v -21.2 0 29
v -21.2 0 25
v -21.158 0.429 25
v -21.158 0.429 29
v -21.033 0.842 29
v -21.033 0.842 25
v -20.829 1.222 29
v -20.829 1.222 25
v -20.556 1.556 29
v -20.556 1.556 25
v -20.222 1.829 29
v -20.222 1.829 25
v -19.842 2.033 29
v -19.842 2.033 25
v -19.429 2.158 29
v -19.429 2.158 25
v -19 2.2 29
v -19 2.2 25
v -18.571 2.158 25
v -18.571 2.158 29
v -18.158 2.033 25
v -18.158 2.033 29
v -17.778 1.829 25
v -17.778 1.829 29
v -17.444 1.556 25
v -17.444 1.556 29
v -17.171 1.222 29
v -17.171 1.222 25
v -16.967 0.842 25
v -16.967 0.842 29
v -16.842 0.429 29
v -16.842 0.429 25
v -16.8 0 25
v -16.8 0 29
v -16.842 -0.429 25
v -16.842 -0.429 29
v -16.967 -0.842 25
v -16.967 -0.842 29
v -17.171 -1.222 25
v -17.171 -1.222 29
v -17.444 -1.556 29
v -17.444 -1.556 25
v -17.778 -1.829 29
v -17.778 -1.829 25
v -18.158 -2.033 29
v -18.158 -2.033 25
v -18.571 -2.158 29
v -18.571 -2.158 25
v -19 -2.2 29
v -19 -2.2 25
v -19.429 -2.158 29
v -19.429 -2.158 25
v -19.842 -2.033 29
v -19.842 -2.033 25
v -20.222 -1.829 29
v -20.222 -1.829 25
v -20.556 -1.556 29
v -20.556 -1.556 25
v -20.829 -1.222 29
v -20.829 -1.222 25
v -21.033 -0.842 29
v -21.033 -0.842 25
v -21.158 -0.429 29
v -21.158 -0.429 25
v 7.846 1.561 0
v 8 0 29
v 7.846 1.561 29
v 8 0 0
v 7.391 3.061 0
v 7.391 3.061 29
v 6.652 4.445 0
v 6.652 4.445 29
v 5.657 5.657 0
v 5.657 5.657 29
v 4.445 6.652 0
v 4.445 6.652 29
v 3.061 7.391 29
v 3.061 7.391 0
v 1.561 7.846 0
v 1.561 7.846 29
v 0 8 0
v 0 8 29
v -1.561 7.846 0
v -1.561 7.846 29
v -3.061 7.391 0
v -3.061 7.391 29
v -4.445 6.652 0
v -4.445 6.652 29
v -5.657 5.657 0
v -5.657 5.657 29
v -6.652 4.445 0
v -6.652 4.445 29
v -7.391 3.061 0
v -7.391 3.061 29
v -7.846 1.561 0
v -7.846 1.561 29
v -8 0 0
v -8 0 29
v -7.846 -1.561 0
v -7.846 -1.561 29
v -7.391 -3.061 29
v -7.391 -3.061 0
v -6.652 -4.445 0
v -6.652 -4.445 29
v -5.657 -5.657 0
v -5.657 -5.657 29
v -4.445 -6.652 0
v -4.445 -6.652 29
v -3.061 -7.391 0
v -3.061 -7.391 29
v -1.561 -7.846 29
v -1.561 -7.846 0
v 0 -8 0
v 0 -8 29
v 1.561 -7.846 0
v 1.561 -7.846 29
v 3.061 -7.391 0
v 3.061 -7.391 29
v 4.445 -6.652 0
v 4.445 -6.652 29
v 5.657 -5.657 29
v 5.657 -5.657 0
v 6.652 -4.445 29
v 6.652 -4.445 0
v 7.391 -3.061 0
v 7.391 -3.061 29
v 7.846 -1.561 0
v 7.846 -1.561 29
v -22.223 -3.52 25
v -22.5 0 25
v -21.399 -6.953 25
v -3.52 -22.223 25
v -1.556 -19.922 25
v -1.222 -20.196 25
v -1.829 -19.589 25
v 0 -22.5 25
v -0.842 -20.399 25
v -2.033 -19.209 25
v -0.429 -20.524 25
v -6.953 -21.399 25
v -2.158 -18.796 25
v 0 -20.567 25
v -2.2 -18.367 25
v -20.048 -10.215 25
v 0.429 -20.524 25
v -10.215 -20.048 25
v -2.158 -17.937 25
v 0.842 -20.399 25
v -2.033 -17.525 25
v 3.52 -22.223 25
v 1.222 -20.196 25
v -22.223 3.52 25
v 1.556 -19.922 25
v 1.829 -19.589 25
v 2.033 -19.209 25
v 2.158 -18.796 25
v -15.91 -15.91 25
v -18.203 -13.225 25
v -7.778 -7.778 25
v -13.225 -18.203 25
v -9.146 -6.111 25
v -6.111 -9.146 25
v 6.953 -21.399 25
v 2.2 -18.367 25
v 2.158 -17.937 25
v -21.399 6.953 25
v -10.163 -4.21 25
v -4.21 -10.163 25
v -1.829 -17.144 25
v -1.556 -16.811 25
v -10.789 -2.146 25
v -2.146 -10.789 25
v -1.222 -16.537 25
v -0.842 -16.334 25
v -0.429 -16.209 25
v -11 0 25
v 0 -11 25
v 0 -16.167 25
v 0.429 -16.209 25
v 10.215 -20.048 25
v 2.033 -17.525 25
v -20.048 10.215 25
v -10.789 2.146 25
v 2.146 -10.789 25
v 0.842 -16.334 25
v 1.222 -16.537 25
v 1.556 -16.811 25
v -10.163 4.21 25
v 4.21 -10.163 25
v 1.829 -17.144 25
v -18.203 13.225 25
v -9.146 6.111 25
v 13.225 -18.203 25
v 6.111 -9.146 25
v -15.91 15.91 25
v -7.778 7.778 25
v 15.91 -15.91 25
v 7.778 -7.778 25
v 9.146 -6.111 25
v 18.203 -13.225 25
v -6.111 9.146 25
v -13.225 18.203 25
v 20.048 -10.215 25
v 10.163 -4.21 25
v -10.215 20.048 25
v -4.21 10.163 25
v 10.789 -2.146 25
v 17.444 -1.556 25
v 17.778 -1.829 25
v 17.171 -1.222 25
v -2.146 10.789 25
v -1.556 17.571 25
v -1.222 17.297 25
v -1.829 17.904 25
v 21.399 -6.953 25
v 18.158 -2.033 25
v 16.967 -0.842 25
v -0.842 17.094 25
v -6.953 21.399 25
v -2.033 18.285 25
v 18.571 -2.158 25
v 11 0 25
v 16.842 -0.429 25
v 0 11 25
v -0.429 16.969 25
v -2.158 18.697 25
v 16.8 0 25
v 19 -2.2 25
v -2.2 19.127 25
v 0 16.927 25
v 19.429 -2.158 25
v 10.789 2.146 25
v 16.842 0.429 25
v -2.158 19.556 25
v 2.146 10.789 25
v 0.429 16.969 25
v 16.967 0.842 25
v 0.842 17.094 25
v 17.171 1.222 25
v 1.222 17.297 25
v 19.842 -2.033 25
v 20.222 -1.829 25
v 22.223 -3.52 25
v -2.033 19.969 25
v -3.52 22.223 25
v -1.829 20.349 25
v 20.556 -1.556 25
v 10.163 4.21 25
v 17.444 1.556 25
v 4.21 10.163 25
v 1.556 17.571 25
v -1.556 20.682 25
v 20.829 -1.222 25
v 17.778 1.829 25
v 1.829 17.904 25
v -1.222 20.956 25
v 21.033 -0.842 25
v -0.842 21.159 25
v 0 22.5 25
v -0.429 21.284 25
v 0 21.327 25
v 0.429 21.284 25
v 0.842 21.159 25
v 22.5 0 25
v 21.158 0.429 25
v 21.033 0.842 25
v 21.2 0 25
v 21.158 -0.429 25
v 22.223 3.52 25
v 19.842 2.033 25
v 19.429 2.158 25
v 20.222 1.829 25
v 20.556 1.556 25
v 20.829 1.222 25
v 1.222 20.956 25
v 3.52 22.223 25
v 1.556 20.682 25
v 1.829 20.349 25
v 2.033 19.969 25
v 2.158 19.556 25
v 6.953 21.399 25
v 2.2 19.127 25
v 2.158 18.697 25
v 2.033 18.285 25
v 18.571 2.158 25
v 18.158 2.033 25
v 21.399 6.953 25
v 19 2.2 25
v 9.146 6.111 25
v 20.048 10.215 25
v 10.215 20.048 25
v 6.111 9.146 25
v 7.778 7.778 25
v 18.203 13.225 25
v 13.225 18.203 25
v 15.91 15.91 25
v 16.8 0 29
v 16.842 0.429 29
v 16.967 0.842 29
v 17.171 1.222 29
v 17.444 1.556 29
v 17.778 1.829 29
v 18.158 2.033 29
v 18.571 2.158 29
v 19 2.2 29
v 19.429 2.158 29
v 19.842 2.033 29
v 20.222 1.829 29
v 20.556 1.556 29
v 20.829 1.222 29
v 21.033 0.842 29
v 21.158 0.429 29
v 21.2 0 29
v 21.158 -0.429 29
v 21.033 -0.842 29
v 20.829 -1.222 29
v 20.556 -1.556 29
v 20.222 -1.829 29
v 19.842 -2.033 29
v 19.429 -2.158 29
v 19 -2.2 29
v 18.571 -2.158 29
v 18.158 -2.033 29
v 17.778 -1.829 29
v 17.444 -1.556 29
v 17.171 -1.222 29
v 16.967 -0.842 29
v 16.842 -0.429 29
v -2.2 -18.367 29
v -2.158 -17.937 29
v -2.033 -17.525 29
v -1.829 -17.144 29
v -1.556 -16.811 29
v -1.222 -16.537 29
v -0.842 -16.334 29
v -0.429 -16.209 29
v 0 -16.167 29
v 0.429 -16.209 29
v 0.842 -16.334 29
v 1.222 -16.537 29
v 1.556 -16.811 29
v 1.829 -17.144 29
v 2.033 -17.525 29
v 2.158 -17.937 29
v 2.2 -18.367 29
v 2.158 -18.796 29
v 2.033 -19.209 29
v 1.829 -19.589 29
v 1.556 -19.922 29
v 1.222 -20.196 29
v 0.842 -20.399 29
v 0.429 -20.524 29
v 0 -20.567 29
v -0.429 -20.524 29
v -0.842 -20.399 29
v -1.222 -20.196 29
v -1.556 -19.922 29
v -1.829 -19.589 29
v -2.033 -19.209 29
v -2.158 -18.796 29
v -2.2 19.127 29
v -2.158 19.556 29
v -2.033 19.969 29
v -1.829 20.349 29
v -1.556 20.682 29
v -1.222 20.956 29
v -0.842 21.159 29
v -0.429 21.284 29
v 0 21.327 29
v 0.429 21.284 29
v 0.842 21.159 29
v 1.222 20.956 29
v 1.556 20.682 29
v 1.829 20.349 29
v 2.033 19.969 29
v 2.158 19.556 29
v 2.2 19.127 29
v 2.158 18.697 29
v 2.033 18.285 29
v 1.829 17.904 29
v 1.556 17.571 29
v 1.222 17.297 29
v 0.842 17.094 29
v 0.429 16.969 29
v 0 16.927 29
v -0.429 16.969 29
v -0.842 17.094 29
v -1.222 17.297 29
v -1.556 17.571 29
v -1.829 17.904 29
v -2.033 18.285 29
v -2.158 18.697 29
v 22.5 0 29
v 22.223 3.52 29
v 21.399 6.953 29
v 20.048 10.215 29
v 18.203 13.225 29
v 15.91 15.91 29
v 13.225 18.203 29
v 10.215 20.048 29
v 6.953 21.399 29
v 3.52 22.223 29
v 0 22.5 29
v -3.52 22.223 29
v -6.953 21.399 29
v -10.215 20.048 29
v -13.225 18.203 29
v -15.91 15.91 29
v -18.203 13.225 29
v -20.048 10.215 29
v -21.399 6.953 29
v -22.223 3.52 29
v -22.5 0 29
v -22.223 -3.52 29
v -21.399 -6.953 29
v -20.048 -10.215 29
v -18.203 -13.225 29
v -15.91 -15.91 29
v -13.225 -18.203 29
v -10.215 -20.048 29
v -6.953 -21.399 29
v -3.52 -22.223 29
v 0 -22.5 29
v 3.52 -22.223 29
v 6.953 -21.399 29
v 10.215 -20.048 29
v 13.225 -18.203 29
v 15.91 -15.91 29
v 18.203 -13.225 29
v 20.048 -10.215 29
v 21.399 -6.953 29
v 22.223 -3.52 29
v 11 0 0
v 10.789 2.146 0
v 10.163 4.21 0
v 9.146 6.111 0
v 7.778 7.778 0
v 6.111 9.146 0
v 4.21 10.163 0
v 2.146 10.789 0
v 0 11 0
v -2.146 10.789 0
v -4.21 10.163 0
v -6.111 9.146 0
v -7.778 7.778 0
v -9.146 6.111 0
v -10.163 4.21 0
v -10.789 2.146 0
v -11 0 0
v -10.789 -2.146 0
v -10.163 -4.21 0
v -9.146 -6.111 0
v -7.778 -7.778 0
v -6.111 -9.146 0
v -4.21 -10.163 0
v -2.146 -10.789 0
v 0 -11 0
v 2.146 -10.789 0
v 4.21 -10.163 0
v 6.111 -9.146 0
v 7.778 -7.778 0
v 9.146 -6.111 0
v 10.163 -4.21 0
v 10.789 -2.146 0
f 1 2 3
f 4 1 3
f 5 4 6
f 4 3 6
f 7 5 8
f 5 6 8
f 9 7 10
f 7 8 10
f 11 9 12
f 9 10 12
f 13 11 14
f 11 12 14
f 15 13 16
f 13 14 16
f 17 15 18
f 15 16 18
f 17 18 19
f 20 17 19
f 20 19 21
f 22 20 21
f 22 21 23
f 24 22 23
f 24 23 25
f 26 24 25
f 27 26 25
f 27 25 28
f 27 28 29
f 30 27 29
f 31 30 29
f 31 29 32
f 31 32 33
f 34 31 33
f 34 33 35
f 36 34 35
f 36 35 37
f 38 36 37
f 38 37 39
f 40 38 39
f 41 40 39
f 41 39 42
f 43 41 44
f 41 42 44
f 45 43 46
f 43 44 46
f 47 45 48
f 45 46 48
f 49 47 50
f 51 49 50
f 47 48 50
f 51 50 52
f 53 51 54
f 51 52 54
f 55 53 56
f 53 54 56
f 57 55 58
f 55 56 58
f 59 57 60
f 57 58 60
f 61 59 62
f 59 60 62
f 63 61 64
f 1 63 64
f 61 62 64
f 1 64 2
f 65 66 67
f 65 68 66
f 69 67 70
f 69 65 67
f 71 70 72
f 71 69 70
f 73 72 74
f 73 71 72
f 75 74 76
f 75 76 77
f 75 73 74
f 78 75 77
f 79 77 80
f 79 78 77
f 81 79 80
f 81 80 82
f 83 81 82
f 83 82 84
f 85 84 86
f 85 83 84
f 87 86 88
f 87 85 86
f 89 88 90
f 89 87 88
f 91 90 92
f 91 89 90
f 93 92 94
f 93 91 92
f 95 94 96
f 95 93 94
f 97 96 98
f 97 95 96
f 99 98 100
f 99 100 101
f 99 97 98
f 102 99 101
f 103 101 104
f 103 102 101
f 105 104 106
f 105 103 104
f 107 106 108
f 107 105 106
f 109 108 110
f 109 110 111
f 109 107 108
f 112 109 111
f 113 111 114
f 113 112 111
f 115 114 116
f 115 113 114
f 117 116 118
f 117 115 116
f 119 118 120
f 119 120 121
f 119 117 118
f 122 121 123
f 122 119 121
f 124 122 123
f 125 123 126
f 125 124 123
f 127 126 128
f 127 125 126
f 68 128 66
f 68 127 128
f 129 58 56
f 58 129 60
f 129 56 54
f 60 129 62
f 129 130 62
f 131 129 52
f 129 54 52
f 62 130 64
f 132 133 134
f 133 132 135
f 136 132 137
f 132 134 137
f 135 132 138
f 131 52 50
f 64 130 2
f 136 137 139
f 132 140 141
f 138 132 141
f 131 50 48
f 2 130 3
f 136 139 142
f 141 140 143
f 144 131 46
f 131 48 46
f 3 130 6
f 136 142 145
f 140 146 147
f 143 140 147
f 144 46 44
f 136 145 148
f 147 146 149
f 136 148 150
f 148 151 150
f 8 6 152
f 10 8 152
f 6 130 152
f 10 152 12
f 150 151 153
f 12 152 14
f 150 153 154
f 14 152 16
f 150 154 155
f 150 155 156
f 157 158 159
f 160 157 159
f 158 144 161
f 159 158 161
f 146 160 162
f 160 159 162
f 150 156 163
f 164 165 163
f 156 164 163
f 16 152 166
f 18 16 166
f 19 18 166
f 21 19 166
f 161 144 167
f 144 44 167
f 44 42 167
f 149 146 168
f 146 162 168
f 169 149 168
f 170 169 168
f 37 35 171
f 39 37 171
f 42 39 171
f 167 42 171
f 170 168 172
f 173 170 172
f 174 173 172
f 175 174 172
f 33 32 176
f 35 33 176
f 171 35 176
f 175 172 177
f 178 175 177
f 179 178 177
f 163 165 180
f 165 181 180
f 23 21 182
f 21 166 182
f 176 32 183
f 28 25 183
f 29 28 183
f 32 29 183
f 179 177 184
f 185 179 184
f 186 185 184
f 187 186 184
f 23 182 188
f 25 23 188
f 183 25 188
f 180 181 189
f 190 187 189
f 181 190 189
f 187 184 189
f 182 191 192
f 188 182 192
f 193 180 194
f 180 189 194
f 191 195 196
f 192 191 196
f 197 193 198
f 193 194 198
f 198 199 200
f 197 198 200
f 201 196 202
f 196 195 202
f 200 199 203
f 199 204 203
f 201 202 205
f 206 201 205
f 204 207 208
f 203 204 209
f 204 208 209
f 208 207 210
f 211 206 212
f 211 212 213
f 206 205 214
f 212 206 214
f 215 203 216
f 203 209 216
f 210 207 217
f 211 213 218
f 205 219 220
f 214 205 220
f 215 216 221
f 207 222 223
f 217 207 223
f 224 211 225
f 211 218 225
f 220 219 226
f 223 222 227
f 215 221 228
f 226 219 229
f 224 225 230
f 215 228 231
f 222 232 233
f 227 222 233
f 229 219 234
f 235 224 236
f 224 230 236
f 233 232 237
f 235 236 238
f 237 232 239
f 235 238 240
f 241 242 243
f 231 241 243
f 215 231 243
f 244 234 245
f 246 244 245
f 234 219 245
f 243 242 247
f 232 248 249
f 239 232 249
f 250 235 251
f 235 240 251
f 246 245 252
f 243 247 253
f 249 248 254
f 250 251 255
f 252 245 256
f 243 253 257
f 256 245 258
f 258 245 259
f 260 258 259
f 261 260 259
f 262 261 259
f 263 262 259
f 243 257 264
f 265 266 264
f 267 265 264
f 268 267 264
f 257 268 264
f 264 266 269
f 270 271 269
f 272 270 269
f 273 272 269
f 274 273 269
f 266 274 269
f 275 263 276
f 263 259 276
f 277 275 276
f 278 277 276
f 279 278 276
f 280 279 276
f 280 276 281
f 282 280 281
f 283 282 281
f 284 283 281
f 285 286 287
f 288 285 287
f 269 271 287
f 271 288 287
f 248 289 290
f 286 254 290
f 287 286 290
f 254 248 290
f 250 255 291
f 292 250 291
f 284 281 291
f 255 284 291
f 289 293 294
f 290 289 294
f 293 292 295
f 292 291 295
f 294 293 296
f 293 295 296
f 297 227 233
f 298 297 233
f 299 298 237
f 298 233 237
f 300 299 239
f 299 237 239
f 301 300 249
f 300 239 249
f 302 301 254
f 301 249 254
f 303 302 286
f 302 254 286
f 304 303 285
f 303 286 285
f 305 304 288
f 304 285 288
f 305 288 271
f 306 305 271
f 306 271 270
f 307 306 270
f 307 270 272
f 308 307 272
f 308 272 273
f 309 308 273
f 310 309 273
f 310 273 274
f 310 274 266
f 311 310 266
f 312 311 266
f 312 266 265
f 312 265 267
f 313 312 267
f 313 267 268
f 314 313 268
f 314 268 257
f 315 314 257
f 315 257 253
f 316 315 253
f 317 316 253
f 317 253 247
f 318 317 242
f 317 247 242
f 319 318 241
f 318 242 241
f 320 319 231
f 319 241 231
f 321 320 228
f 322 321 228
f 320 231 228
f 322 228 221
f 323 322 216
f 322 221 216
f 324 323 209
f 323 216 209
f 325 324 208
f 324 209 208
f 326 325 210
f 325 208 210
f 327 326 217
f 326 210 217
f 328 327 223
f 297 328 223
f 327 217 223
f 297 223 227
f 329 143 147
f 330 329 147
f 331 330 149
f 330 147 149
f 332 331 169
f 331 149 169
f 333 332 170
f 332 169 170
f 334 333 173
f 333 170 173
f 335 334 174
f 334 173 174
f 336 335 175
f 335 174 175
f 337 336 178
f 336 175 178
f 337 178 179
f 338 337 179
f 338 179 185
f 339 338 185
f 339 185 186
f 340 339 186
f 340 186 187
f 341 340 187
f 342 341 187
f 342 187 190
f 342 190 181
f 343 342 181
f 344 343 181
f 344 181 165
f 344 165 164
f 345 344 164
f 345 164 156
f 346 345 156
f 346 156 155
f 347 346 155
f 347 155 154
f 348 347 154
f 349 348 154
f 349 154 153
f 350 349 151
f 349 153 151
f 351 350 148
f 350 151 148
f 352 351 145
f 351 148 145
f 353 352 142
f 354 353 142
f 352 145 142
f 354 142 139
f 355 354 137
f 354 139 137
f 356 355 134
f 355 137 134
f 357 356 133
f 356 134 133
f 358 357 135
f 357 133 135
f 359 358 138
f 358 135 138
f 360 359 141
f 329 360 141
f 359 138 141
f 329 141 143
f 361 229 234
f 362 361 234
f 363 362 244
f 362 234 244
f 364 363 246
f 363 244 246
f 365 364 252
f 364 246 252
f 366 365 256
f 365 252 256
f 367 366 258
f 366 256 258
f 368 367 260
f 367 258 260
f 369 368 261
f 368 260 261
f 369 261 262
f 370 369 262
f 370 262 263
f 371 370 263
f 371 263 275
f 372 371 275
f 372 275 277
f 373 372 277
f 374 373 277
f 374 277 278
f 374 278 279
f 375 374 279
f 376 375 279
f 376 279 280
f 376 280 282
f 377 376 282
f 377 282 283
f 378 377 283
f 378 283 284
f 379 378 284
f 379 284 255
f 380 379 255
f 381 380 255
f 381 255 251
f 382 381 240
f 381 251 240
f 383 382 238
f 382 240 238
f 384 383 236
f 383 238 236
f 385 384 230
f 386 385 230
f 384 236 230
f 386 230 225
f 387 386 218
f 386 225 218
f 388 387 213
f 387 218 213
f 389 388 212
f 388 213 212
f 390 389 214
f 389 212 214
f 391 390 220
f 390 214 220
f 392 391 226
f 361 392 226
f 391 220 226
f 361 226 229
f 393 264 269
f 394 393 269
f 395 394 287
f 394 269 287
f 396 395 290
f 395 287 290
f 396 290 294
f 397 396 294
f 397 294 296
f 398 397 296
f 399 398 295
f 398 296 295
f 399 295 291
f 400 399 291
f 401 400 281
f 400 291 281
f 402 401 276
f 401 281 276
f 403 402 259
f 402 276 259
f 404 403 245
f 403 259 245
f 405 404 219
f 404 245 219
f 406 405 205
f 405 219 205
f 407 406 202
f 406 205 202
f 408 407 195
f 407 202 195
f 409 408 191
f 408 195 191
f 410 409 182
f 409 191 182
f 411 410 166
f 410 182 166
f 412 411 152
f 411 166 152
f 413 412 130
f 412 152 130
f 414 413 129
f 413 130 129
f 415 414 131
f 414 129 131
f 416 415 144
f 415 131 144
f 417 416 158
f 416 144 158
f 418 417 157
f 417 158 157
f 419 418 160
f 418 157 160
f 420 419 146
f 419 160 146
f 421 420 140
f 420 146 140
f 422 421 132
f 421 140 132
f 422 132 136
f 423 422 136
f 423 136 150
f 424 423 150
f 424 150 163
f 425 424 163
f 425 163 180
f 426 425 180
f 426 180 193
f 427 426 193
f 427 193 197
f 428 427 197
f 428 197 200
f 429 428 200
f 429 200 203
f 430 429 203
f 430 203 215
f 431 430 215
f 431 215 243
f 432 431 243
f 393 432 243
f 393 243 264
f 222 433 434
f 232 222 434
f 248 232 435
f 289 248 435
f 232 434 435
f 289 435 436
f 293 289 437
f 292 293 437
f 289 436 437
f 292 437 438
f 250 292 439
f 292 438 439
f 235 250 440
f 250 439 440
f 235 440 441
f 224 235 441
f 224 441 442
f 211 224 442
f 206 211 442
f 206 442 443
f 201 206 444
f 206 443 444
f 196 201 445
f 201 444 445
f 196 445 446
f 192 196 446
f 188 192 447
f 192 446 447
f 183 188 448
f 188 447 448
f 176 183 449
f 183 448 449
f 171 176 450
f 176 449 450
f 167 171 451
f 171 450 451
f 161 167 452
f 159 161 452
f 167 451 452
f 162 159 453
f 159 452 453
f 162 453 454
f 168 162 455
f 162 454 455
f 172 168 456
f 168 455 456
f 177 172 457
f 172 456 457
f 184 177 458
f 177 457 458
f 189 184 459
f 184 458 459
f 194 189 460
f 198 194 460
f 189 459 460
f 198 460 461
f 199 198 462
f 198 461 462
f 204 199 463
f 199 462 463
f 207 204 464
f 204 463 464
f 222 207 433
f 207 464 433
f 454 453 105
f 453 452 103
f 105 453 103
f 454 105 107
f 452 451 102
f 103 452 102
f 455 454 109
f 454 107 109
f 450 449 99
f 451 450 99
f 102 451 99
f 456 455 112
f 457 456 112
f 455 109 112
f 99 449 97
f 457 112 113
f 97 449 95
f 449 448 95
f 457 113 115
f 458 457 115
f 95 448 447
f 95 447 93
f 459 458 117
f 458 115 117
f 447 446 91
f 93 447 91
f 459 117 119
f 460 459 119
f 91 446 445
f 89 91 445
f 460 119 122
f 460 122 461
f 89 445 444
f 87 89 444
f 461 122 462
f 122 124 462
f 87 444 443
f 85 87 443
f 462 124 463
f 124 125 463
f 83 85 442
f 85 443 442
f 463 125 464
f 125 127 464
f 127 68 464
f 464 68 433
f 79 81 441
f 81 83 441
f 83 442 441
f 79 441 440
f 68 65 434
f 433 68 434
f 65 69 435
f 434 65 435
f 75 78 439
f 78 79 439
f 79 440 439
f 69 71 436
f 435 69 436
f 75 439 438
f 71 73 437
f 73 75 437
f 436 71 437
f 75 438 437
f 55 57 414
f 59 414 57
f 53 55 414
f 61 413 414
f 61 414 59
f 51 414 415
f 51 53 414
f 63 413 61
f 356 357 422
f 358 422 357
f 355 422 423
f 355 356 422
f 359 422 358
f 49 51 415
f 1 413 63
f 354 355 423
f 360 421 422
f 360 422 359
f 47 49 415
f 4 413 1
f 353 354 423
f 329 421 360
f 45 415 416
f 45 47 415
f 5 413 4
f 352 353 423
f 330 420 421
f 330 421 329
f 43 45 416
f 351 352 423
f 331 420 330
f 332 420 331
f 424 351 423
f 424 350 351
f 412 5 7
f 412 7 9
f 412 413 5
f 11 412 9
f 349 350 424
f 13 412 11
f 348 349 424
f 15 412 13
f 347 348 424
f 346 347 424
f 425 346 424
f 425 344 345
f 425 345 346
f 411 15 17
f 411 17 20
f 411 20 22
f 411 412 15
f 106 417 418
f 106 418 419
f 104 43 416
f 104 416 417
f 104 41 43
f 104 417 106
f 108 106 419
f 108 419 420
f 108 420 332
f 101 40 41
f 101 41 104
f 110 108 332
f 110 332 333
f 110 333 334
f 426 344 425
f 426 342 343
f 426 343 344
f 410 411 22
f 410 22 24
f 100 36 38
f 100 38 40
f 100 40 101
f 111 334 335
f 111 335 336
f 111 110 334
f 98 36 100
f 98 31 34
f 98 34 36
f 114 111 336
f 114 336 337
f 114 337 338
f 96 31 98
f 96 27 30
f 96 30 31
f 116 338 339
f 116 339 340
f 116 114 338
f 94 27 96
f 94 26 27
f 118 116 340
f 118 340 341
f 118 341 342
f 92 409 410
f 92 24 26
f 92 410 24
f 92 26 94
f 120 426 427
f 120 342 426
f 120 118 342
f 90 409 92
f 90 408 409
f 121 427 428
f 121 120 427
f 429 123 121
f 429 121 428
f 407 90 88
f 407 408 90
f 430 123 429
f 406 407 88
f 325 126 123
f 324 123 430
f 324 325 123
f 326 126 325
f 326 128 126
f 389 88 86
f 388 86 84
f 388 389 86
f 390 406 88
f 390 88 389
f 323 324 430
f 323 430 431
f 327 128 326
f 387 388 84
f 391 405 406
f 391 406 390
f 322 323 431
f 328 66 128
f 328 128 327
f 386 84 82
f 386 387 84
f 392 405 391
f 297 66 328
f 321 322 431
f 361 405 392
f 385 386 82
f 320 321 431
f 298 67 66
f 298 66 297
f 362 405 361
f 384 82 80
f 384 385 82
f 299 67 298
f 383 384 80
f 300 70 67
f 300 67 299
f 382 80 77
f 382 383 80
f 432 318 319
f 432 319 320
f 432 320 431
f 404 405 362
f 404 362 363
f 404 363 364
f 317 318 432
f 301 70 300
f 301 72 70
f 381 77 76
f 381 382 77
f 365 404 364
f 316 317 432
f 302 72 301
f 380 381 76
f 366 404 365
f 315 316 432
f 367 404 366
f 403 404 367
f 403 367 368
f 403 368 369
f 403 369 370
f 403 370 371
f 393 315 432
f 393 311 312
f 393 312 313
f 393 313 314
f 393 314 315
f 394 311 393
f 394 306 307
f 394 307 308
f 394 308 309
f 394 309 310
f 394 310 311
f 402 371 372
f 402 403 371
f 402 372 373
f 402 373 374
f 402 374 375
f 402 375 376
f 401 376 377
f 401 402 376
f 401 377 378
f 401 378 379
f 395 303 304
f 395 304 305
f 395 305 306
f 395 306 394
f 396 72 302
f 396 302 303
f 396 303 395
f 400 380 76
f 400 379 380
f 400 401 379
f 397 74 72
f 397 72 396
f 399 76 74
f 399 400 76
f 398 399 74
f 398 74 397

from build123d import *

# Parameters (mm, degrees)
F0_R     = 11
F0_R_2   = 8
F1_DEPTH = 25
F2_R     = 22.5
F2_R_2   = 11
F2_R_3   = 8
F3_DEPTH = 4
F5_D     = 4.4


with BuildPart() as f1:
    # F0 (on Top) → F1 (new body)
    with BuildSketch(Plane.XY):
        Circle(F0_R)
        Circle(F0_R_2, mode=Mode.SUBTRACT)
    extrude(amount=F1_DEPTH)

    # F2 (on face) → F3 (join)
    with BuildSketch(Plane.XY.offset(25)):
        Circle(F2_R)
        Circle(F2_R_2, mode=Mode.SUBTRACT)
        Circle(F2_R_2)
        Circle(F2_R_3, mode=Mode.SUBTRACT)
    extrude(amount=F3_DEPTH)

    # F5 (through all)
    with Locations(Plane.XY.offset(29)):
        with Locations((-19, 0), (0, 19.126665961), (19, 0), (0, -18.3666665865)):
            Hole(F5_D / 2)


solid = f1.part
